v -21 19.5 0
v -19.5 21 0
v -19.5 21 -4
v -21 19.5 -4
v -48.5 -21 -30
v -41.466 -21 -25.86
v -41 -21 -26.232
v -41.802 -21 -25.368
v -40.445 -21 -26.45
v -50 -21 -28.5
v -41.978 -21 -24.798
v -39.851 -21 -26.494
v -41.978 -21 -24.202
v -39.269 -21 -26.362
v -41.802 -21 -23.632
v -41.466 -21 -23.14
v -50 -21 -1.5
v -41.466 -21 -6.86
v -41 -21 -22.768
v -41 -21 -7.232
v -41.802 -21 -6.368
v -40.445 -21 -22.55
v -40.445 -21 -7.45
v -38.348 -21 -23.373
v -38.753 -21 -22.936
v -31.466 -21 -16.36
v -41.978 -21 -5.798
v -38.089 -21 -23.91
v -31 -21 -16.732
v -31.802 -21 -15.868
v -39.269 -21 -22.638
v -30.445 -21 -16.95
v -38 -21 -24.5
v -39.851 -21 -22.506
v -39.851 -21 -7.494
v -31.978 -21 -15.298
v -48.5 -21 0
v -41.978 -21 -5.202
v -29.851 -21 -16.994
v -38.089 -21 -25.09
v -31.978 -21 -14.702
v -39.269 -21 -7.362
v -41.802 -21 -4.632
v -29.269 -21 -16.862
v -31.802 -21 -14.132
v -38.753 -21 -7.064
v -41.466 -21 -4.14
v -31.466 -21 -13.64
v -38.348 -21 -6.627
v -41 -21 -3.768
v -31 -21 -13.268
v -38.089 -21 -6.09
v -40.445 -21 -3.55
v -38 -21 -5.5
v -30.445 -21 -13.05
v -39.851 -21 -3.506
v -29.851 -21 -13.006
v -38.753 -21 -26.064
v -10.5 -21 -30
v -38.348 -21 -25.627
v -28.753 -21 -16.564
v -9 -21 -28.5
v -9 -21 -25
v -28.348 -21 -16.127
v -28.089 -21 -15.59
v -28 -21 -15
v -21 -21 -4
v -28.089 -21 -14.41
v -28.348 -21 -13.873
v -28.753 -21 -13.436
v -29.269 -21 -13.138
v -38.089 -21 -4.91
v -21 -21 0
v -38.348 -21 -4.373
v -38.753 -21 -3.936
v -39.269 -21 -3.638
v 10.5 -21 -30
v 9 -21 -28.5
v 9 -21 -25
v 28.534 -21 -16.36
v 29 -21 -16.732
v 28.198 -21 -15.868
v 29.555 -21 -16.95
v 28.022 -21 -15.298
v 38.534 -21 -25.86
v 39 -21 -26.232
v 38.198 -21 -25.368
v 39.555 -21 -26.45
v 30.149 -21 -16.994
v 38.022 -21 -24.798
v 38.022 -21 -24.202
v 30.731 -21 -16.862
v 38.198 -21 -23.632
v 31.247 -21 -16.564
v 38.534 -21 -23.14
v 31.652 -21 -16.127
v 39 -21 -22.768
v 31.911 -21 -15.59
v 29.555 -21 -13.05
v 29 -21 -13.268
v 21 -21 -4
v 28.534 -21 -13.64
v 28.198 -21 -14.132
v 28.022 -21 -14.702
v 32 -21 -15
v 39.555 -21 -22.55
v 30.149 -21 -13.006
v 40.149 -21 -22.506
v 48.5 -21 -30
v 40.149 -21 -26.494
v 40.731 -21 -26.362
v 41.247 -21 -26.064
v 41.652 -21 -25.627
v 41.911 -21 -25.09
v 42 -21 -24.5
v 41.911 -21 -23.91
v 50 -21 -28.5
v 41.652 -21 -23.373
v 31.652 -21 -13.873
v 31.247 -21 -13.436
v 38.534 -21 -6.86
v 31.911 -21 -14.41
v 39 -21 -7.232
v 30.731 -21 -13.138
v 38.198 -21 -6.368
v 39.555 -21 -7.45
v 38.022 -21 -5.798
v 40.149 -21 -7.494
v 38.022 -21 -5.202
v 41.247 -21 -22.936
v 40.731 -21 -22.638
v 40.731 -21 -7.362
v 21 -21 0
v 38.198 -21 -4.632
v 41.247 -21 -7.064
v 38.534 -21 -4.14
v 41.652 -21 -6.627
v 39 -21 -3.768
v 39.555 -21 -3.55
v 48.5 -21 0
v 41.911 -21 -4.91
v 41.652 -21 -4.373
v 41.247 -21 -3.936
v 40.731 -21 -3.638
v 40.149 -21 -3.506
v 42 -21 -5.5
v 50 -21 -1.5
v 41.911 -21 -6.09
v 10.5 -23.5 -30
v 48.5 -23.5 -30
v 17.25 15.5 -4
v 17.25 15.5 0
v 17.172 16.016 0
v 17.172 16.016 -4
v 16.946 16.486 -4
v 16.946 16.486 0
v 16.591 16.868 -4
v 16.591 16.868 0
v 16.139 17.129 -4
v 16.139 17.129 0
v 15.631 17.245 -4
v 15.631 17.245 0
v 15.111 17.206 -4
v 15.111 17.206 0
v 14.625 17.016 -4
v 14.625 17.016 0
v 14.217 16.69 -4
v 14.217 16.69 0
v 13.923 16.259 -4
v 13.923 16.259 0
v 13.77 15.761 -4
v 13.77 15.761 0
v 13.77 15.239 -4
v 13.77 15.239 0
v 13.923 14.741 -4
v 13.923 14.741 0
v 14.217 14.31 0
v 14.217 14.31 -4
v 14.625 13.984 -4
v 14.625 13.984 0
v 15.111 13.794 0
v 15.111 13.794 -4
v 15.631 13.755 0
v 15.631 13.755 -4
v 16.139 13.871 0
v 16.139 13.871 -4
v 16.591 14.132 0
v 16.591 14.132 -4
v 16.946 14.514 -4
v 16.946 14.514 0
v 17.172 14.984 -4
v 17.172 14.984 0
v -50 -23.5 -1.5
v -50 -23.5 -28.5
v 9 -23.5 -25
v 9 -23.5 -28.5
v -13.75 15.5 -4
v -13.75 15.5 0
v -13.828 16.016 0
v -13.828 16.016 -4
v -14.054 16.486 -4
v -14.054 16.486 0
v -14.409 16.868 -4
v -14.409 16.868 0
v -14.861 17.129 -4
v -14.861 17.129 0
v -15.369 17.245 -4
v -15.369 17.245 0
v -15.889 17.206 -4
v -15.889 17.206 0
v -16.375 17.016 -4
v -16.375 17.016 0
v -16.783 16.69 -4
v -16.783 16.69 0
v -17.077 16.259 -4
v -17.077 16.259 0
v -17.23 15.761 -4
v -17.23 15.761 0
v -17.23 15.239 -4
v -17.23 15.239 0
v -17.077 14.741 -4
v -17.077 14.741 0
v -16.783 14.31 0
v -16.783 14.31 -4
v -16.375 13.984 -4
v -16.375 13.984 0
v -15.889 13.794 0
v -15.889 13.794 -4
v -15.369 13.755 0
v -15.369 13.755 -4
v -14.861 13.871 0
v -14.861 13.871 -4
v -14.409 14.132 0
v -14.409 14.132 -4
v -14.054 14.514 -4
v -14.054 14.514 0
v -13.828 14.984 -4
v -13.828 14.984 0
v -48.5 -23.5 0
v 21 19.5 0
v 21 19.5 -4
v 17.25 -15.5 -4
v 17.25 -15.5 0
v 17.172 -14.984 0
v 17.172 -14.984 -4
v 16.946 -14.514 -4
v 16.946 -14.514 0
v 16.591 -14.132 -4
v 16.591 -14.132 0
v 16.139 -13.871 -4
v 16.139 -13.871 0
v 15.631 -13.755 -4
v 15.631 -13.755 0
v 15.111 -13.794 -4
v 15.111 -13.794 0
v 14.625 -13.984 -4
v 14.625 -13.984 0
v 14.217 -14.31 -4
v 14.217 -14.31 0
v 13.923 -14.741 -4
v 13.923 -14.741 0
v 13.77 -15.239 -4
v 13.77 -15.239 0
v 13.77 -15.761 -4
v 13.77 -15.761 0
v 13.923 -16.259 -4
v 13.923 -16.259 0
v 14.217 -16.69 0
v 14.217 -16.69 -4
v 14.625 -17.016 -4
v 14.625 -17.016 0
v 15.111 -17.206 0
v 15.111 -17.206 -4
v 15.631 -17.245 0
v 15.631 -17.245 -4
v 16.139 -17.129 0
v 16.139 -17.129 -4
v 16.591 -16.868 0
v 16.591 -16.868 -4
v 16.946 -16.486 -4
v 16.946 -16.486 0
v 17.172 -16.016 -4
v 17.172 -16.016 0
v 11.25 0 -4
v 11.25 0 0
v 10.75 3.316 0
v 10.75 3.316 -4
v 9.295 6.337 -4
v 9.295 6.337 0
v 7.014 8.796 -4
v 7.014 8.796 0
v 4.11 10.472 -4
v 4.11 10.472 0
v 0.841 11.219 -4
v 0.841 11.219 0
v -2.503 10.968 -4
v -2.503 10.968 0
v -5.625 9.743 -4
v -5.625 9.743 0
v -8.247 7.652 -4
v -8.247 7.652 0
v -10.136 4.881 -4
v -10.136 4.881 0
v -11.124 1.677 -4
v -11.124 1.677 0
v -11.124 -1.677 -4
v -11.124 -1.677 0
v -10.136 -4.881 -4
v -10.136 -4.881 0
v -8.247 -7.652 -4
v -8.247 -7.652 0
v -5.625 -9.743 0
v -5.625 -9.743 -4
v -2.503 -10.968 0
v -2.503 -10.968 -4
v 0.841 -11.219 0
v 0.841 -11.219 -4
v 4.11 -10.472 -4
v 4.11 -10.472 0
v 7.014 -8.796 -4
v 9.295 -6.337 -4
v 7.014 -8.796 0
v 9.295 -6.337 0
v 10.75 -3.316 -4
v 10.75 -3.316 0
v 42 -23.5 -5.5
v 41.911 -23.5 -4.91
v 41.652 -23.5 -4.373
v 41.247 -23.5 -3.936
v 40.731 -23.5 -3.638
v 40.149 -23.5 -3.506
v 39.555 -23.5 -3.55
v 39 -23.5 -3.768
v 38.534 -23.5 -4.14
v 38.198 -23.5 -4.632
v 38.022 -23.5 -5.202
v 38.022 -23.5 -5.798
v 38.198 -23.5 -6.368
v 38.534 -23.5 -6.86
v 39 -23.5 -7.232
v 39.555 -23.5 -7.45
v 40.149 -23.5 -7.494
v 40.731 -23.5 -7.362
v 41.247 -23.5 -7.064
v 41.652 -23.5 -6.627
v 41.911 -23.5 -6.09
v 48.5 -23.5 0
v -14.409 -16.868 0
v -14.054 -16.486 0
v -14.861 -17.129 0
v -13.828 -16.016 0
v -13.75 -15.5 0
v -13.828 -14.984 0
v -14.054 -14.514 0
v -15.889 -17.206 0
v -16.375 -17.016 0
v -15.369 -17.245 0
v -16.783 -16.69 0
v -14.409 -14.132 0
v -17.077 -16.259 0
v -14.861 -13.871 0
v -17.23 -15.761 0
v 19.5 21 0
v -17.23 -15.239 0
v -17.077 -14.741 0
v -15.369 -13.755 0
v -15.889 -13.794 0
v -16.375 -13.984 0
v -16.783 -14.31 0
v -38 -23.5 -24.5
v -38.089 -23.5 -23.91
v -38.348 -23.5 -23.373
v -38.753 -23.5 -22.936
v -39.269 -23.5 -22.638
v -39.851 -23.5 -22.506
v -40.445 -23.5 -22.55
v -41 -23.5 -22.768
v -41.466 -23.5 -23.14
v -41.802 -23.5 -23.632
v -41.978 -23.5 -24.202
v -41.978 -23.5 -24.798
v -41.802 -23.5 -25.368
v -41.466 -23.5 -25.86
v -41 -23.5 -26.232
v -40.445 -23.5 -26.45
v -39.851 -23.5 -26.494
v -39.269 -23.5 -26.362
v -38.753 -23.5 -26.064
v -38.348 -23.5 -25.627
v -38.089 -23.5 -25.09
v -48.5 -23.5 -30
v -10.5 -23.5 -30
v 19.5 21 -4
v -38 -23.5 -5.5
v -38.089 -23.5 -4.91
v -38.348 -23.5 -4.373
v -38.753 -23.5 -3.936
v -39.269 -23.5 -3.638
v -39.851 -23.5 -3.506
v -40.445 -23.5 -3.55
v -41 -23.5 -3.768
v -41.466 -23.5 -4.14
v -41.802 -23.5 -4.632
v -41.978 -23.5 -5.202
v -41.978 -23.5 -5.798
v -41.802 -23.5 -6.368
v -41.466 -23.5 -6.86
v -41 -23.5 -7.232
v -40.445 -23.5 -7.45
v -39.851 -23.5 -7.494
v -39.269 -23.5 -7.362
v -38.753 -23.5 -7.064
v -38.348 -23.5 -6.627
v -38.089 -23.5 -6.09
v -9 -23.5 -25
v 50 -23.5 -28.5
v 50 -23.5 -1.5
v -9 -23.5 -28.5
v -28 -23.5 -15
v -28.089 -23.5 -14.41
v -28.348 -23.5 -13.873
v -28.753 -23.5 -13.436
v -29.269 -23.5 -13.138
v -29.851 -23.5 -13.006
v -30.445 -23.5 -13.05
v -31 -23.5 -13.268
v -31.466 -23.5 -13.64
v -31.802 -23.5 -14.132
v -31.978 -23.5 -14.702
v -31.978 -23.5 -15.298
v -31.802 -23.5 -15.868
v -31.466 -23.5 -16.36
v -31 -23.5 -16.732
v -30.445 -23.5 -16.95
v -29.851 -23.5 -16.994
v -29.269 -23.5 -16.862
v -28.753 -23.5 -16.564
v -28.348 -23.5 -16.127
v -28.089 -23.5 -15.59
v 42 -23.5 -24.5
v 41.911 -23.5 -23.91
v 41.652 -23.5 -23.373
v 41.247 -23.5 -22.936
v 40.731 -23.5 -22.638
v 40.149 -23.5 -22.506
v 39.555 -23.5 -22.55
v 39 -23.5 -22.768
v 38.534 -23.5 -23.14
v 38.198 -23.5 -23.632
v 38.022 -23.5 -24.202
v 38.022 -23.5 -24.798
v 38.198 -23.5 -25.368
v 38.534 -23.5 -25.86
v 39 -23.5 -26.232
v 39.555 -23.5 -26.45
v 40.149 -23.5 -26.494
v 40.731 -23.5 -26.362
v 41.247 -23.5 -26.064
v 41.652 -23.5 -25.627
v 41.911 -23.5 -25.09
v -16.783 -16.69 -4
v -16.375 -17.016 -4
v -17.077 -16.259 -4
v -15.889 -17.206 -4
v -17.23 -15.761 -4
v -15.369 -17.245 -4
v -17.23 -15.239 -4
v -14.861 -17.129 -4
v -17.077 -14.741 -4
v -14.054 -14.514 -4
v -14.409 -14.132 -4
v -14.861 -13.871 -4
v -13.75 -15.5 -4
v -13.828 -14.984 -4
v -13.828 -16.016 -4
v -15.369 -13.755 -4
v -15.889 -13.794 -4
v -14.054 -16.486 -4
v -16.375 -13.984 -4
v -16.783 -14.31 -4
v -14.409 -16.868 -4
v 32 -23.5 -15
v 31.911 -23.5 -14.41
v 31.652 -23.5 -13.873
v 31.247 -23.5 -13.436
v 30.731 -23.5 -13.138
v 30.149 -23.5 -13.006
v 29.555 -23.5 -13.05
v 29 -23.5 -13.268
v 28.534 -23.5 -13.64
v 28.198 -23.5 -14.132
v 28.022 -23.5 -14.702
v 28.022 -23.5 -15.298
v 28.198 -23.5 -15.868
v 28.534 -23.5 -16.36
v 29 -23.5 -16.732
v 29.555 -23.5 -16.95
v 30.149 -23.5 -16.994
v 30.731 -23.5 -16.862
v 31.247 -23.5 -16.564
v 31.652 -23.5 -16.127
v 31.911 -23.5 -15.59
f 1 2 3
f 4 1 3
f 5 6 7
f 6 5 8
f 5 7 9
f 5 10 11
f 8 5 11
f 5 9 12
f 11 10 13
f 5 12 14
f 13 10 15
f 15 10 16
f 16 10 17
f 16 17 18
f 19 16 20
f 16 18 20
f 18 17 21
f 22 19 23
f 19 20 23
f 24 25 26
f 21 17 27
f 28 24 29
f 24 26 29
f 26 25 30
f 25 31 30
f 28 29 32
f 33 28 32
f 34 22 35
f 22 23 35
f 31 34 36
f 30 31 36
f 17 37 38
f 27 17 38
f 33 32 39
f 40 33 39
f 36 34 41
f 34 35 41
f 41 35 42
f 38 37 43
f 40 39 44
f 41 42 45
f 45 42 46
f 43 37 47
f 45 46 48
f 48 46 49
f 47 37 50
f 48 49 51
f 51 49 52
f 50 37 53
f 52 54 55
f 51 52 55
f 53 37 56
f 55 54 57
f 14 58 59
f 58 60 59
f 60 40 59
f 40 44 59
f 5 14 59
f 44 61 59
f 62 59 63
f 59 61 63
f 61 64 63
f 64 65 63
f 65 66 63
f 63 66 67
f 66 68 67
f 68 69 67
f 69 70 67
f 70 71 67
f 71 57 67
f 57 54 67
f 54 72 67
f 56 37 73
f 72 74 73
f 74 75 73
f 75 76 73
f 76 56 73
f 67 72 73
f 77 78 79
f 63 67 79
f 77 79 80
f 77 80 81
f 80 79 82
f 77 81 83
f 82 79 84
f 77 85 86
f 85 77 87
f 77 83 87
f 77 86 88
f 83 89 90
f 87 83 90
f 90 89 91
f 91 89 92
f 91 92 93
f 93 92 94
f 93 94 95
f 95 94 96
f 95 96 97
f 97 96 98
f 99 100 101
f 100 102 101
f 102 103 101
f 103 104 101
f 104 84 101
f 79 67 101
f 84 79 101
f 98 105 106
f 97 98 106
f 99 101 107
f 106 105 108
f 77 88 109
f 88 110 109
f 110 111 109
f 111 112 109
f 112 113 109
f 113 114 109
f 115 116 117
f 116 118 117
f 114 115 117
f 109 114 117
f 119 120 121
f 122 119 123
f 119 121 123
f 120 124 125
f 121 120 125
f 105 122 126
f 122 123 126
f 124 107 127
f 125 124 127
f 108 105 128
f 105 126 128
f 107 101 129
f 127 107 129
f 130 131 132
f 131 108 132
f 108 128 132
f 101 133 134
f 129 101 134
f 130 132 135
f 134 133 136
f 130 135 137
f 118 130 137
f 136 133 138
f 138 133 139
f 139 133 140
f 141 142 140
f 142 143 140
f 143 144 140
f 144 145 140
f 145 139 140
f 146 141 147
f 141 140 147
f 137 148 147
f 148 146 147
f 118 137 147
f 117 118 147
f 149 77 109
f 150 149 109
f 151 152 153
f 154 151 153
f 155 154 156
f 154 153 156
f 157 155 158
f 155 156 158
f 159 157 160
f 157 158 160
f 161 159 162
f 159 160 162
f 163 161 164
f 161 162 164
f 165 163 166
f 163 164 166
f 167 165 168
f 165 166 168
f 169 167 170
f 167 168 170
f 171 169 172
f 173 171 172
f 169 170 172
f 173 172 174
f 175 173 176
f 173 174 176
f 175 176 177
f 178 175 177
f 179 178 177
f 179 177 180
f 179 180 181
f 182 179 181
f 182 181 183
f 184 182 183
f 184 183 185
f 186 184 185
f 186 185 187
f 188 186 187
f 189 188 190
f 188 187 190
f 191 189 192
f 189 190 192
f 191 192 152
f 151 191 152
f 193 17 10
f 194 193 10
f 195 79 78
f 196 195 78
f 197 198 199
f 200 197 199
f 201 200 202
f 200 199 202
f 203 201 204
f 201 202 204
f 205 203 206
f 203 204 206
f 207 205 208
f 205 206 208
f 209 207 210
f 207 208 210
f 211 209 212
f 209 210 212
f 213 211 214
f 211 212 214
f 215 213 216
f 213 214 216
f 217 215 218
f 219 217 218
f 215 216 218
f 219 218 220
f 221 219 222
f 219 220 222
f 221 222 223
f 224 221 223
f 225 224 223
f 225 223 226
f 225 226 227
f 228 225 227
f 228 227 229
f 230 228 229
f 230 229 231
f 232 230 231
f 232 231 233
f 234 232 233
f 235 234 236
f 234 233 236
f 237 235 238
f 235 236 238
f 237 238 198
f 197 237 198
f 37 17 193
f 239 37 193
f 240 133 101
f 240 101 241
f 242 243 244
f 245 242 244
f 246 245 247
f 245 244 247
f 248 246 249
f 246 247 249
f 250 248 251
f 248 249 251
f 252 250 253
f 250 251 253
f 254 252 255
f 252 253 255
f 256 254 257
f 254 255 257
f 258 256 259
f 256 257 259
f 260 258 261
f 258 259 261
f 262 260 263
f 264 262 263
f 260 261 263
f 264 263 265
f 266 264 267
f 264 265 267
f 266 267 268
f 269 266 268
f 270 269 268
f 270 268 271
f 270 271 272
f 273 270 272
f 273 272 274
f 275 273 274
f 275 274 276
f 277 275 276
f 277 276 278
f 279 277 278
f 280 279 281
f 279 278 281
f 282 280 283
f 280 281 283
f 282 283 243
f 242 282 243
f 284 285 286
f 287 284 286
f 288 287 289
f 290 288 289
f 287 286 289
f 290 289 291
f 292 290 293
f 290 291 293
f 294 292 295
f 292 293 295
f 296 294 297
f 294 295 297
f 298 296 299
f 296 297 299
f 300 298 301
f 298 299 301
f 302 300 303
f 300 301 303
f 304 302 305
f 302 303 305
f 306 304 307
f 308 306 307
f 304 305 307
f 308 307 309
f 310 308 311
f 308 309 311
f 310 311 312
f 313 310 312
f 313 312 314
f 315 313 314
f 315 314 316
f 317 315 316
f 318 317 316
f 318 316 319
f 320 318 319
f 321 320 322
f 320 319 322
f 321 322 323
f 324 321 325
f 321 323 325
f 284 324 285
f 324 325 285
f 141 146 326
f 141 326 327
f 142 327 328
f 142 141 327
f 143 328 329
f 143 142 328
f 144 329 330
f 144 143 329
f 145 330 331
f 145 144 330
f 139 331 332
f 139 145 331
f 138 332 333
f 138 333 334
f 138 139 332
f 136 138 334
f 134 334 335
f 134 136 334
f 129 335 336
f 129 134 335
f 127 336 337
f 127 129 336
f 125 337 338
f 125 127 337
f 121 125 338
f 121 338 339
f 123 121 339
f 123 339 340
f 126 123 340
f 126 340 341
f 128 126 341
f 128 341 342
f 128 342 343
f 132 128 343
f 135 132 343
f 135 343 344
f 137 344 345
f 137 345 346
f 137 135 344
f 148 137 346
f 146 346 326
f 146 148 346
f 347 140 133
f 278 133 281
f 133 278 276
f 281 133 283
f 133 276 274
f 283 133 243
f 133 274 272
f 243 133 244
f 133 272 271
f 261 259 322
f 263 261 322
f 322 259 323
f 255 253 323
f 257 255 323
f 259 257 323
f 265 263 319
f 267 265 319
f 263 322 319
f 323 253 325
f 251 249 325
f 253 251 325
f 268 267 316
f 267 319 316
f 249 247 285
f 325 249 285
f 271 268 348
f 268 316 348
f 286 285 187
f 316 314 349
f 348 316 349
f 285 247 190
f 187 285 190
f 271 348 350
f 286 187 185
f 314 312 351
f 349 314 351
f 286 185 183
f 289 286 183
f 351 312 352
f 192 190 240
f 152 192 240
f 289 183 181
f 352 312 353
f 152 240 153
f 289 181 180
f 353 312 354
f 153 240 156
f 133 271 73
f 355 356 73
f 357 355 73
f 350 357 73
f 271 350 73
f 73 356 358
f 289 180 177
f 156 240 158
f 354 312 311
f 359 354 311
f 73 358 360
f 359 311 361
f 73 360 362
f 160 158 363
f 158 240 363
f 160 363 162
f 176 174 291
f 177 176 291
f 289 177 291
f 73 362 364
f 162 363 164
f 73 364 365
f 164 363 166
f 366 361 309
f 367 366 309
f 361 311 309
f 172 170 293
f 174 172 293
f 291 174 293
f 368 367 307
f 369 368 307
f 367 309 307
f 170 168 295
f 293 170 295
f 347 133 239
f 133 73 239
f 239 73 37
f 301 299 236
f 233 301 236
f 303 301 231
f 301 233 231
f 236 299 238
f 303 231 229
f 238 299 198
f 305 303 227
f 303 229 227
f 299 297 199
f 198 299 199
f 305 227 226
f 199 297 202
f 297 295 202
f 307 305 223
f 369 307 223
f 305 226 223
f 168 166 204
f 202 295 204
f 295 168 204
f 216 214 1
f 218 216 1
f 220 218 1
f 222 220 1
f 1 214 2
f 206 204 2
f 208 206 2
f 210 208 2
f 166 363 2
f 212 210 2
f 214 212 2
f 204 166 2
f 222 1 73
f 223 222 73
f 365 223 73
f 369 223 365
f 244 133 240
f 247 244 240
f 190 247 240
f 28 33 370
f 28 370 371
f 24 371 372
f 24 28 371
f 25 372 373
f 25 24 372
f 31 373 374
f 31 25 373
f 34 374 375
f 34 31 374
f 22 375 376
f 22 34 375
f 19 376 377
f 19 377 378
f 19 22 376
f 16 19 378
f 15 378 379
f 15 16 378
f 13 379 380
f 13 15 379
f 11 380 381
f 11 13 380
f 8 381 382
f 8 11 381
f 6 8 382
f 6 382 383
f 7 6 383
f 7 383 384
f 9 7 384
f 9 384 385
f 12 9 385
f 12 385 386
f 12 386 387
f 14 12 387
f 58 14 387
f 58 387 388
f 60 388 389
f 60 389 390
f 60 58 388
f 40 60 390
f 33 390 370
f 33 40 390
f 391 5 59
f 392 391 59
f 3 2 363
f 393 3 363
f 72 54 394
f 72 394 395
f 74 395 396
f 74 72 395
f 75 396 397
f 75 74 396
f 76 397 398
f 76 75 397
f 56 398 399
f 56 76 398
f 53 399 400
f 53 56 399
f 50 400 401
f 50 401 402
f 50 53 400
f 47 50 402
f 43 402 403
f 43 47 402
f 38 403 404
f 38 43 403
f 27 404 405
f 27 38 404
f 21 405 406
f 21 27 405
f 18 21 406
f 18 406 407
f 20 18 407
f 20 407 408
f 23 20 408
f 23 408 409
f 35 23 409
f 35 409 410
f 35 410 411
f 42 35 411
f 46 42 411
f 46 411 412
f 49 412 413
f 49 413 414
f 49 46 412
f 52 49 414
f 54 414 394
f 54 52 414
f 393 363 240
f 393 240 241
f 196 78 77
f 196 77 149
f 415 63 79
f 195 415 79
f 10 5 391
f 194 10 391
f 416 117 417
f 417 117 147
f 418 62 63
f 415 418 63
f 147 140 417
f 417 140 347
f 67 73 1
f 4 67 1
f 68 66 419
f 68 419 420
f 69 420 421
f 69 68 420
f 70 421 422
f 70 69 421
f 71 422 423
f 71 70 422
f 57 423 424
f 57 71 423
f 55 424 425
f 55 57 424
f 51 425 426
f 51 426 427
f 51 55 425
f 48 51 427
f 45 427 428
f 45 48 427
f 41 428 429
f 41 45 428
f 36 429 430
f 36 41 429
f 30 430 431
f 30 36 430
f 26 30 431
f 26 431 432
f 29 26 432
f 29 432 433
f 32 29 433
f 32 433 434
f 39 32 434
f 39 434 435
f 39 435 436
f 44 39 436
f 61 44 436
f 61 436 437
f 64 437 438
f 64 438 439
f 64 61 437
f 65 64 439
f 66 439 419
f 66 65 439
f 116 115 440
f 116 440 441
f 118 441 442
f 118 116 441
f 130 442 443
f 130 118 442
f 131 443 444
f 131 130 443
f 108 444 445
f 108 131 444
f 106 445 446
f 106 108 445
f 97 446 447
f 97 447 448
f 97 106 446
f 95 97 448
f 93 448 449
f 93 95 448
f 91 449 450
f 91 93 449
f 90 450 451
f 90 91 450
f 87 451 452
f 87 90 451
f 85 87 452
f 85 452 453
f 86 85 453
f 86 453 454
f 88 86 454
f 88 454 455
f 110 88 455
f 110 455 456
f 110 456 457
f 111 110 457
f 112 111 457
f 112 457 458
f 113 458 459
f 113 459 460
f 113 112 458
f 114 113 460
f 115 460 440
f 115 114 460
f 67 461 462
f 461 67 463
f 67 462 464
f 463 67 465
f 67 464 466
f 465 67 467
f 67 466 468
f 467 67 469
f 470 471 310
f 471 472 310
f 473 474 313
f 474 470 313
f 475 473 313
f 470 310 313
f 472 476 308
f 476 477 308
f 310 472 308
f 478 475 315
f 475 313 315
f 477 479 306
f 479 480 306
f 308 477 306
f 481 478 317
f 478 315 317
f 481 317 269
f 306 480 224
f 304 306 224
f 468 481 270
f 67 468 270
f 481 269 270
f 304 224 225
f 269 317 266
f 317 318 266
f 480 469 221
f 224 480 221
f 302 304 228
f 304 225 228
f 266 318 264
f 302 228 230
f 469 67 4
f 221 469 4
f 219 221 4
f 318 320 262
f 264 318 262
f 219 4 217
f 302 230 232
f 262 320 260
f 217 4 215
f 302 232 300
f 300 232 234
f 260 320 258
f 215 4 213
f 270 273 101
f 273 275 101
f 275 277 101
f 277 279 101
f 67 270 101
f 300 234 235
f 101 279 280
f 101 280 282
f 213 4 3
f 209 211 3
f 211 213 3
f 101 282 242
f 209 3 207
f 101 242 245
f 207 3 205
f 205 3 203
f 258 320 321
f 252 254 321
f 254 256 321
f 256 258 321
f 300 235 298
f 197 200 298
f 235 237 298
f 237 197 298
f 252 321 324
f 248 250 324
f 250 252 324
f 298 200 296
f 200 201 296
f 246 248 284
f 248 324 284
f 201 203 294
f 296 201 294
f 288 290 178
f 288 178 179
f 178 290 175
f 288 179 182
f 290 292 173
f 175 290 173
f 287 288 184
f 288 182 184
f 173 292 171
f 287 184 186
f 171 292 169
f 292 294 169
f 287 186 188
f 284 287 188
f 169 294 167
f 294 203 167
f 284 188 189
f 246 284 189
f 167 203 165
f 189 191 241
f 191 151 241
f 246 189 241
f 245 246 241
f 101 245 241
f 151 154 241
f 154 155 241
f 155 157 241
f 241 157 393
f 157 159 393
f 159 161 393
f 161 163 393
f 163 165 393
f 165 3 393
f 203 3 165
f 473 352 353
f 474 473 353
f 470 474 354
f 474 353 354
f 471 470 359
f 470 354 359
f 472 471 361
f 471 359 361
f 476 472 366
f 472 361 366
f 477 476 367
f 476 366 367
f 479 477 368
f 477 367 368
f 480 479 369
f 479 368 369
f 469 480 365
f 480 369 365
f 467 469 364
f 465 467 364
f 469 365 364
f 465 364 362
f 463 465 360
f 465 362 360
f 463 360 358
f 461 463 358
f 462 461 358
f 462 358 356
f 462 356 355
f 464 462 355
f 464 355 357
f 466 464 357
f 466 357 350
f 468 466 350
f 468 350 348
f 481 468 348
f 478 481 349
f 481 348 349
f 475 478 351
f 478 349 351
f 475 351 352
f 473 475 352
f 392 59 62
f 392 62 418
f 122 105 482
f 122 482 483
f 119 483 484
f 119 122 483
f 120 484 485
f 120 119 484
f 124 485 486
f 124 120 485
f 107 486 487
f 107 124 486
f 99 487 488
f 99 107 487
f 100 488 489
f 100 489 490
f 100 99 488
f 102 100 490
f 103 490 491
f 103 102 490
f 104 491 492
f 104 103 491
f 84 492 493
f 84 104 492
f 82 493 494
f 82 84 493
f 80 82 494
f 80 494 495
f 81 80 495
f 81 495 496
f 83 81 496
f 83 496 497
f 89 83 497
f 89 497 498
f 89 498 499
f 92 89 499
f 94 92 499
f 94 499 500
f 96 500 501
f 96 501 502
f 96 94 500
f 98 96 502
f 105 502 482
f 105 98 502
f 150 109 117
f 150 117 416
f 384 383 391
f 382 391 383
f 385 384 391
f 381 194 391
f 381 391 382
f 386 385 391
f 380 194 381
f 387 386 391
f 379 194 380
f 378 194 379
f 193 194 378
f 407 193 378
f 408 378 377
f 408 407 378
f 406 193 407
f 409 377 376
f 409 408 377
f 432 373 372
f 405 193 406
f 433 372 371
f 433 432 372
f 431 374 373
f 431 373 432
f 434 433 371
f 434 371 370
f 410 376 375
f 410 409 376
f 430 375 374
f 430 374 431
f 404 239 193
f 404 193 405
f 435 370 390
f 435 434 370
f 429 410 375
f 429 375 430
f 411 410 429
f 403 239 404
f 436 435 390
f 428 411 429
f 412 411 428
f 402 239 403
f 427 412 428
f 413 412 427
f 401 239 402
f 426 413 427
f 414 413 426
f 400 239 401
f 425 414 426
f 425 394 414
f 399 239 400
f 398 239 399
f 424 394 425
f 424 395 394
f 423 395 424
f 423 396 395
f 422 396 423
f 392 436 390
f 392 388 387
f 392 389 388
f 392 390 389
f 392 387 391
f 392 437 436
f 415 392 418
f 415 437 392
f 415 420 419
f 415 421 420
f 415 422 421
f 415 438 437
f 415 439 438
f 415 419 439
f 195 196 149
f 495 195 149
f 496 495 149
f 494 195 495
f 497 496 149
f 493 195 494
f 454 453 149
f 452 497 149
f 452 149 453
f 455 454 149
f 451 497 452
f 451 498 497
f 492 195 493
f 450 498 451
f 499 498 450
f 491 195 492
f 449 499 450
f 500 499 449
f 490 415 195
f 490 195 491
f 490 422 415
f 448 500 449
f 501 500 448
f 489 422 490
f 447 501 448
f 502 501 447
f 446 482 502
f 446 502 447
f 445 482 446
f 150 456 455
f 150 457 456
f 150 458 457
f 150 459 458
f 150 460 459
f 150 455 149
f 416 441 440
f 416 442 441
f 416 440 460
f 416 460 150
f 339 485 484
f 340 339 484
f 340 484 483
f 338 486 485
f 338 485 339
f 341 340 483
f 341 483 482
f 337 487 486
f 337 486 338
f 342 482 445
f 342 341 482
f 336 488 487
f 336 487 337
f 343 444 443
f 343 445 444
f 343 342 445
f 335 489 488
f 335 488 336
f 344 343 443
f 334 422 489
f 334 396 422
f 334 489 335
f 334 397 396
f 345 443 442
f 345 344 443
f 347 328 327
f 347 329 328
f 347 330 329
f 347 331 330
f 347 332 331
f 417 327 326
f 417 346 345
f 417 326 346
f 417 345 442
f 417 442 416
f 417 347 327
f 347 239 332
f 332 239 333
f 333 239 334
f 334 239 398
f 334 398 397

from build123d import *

# Parameters (mm, degrees)
F0_W     = 42
F0_H     = 42
F0_R     = 1.75
F0_R_2   = 11.25
F1_DEPTH = 4
F2_R     = 2
F2_W     = 42
F2_H     = 4
F3_DEPTH = 2.5
F4_SIZE  = 1.5


# Not quite as in the source:
# - a feature names something its author has since deleted; it is built from what else it names


with BuildPart() as f1:
    # F0 (on Top) → F1 (new body)
    with BuildSketch(Plane.XY):
        Rectangle(F0_W, F0_H)
        with Locations((-15.5, -15.5)):
            Circle(F0_R, mode=Mode.SUBTRACT)
        with Locations((15.5, -15.5)):
            Circle(F0_R, mode=Mode.SUBTRACT)
        with Locations((-15.5, 15.5)):
            Circle(F0_R, mode=Mode.SUBTRACT)
        Circle(F0_R_2, mode=Mode.SUBTRACT)
        with Locations((15.5, 15.5)):
            Circle(F0_R, mode=Mode.SUBTRACT)
    extrude(amount=-F1_DEPTH)

    # F2 (on face) → F3 (join)
    with BuildSketch(Plane.XZ.offset(21)):
        Polygon((50, -30), (50, 0), (21, 0), (21, -4), (-21, -4), (-21, 0), (-50, 0), (-50, -30), (-9, -30), (-9, -25), (9, -25), (9, -30), align=None)
        with Locations((-40, -24.5)):
            Circle(F2_R, mode=Mode.SUBTRACT)
        with Locations((40, -24.5)):
            Circle(F2_R, mode=Mode.SUBTRACT)
        with Locations((-30, -15)):
            Circle(F2_R, mode=Mode.SUBTRACT)
        with Locations((-40, -5.5)):
            Circle(F2_R, mode=Mode.SUBTRACT)
        with Locations((30, -15)):
            Circle(F2_R, mode=Mode.SUBTRACT)
        with Locations((40, -5.5)):
            Circle(F2_R, mode=Mode.SUBTRACT)
        with Locations((0, -2)):
            Rectangle(F2_W, F2_H)
    extrude(amount=F3_DEPTH)

    # F4
    f4_edges = [f1.edges().sort_by_distance(p)[0] for p in [
        (-21, 21, -2),
        (21, 21, -2),
        (-50, -22.25, 0),
        (-50, -22.25, -30),
        (50, -22.25, -30),
        (50, -22.25, 0),
        (-9, -22.25, -30),
        (9, -22.25, -30),
    ]]
    chamfer(f4_edges, length=F4_SIZE)


solid = f1.part
